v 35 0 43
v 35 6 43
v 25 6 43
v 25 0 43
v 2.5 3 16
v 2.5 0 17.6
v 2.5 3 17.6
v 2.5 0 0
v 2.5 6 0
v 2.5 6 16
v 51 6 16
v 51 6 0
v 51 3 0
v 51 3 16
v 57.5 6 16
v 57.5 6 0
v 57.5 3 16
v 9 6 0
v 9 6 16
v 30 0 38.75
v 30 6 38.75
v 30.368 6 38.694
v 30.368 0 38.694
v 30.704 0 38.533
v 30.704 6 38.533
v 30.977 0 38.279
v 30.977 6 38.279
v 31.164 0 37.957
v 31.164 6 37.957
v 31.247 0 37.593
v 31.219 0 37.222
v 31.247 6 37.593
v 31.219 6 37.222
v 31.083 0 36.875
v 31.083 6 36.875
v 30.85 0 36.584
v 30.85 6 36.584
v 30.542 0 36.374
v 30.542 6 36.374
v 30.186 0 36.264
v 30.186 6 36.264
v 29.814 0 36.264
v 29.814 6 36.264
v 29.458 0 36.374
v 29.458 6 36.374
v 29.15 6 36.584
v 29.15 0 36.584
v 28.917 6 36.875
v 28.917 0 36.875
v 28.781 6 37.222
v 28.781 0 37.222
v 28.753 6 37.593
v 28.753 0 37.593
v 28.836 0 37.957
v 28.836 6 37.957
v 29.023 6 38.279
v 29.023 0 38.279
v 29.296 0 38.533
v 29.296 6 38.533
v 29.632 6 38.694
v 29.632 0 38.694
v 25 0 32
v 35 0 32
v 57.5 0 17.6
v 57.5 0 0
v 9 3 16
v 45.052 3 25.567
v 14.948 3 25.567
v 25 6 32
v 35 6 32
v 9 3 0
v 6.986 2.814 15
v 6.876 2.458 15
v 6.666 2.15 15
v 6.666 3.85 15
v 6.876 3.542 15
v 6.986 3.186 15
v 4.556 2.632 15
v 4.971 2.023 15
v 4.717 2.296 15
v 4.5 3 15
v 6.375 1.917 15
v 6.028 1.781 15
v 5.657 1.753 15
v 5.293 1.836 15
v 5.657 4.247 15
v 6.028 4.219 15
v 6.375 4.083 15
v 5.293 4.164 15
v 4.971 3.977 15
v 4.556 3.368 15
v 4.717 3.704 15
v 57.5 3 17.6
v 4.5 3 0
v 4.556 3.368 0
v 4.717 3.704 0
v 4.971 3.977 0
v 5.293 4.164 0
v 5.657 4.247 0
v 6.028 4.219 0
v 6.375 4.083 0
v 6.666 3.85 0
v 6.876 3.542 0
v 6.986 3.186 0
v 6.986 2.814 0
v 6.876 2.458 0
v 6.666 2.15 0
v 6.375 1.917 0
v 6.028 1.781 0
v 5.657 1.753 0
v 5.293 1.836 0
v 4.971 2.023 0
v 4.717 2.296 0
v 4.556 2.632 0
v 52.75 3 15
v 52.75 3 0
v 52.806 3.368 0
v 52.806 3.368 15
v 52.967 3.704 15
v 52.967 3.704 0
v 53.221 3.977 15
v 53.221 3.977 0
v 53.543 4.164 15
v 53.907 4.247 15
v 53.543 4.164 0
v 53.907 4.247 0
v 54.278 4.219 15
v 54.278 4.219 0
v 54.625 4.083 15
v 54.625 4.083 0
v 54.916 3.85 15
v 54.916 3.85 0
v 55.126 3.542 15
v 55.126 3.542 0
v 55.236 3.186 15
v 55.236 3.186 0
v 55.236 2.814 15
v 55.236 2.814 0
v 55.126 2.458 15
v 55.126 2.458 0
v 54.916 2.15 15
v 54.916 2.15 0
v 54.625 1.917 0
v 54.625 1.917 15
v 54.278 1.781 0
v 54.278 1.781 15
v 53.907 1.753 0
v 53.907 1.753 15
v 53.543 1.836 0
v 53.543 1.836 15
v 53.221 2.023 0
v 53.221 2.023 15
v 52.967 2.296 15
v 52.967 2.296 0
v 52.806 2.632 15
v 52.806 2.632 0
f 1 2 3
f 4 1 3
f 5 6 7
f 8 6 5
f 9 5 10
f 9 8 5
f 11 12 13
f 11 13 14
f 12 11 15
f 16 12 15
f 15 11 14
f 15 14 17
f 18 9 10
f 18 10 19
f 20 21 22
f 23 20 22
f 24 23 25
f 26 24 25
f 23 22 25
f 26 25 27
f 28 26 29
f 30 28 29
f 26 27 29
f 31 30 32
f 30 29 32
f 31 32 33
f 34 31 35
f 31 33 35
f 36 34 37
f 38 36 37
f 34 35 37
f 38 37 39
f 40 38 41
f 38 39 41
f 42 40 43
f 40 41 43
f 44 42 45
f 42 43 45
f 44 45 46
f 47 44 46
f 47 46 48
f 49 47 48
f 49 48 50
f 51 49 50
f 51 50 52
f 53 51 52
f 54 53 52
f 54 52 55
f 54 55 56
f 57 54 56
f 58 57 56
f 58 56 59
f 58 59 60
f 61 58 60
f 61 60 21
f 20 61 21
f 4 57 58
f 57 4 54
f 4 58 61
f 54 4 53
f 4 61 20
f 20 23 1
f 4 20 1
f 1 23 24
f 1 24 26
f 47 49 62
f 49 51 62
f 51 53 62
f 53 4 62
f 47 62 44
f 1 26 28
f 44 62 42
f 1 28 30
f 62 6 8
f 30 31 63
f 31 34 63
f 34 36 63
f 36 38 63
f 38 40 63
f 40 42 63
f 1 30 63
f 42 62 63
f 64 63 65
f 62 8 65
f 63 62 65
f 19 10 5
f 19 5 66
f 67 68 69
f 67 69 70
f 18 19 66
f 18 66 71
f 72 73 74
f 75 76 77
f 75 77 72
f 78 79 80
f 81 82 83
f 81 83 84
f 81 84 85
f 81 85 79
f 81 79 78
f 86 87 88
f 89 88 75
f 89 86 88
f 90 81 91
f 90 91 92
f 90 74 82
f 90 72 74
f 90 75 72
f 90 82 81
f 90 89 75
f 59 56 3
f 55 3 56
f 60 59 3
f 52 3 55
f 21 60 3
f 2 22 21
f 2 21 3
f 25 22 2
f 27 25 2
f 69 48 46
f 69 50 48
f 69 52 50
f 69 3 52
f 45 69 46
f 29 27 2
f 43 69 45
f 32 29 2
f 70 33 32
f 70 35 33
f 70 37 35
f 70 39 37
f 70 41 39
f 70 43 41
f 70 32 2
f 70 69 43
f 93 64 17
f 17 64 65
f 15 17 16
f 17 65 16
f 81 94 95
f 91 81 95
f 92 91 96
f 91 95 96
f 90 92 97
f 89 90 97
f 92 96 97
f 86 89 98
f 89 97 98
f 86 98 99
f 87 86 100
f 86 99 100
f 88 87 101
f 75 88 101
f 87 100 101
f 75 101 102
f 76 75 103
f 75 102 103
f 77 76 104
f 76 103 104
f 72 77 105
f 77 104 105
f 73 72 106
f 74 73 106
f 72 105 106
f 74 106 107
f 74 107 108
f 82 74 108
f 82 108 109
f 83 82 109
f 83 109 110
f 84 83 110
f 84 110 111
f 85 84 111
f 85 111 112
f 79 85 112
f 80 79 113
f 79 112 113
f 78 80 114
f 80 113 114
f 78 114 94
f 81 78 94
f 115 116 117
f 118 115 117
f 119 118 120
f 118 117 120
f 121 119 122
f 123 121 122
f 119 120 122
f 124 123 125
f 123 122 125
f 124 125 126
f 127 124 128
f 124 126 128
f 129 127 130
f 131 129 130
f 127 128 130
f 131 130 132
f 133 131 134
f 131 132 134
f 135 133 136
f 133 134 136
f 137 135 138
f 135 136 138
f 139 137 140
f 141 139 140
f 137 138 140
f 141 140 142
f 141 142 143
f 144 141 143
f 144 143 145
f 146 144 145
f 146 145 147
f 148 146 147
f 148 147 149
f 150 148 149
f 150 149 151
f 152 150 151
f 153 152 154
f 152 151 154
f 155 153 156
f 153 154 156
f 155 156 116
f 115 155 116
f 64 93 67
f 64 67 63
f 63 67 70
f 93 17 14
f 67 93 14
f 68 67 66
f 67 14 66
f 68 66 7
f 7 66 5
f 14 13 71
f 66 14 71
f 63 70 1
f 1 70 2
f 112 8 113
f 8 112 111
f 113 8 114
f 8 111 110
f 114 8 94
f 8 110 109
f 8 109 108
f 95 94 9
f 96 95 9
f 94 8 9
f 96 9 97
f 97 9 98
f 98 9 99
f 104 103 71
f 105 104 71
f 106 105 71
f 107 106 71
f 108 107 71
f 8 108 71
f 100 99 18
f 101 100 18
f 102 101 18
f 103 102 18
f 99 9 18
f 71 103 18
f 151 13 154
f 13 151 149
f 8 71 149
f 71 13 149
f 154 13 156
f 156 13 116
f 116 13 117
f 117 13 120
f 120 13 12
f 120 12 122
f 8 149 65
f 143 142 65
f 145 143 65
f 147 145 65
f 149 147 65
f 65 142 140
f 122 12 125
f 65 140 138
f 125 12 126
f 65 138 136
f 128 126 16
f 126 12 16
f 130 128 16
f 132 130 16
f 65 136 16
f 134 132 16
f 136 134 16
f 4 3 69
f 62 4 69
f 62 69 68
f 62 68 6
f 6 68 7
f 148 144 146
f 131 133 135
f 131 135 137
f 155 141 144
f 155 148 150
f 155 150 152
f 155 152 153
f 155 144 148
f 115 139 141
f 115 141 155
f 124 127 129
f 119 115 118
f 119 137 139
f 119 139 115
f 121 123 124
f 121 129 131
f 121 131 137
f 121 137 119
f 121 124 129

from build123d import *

# Parameters (mm, degrees)
ESQUISSE1_W             = 60
ESQUISSE1_H             = 6
BOSS_EXTRU_1_DEPTH      = 60
ESQUISSE2_R             = 1.25
ENL_V_MAT_EXTRU_1_DEPTH = 15
ESQUISSE3_R             = 1.25
ENL_V_MAT_EXTRU_2_DEPTH = 15
ESQUISSE4_W             = 10
ESQUISSE4_H             = 11
ENL_V_MAT_EXTRU_3_DEPTH = 3
ENL_V_MAT_EXTRU_4_DEPTH = 52
CHANFREIN1_SIZE2        = 6.433520762
CHANFREIN1_SIZE         = 3
ESQUISSE6_W             = 2.5
ESQUISSE6_H             = 6
ENL_V_MAT_EXTRU_5_DEPTH = 40


with BuildPart() as part:
    # Esquisse1 → Boss.-Extru.1 (new body)
    with BuildSketch(Plane.XY):
        with Locations((30, 3)):
            Rectangle(ESQUISSE1_W, ESQUISSE1_H)
    extrude(amount=BOSS_EXTRU_1_DEPTH)

    # Esquisse2 → Enlèv. mat.-Extru.1 (cut)
    with BuildSketch(Plane(origin=(0, 0, 0), x_dir=(-1, 0, 0), z_dir=(0, 0, -1))):
        with Locations((-54, 3)):
            Circle(ESQUISSE2_R)
        with Locations((-5.75, 3)):
            Circle(ESQUISSE2_R)
    extrude(amount=-ENL_V_MAT_EXTRU_1_DEPTH, mode=Mode.SUBTRACT)

    # Esquisse3 → Enlèv. mat.-Extru.2 (cut)
    with BuildSketch(Plane(origin=(0, 6, 0), x_dir=(1, 0, 0), z_dir=(0, 1, 0))):
        with Locations(Location((30, -37.5, 0), (0, 0, 270))):
            Circle(ESQUISSE3_R)
    extrude(amount=-ENL_V_MAT_EXTRU_2_DEPTH, mode=Mode.SUBTRACT)

    # Esquisse4 → Enlèv. mat.-Extru.3 (cut)
    with BuildSketch(Plane(origin=(0, 6, 0), x_dir=(1, 0, 0), z_dir=(0, 1, 0))):
        Polygon((0, -16), (9, -16), (9, 0), (51, 0), (51, -16), (60, -16), (60, -60), (0, -60), align=None)
        with Locations((30, -37.5)):
            Rectangle(ESQUISSE4_W, ESQUISSE4_H, mode=Mode.SUBTRACT)
    extrude(amount=-ENL_V_MAT_EXTRU_3_DEPTH, mode=Mode.SUBTRACT)

    # Esquisse5 → Enlèv. mat.-Extru.4 (cut)
    with BuildSketch(Plane(origin=(0, 3, 0), x_dir=(1, 0, 0), z_dir=(0, 1, 0))):
        Polygon((60, -16), (35, -32), (35, -43), (25, -43), (25, -32), (0, -16), (-21.594855386, -85.475485762), (75.414479662, -69.930764824), align=None)
    extrude(amount=-ENL_V_MAT_EXTRU_4_DEPTH, mode=Mode.SUBTRACT)

    # Chanfrein1
    chanfrein1_edges = [part.edges().sort_by_distance(p)[0] for p in [
        (30, 3, 32),
    ]]
    chanfrein1_side = [part.faces().sort_by_distance(p)[0] for p in [
        (30, 3.06, 32),
    ]]
    chamfer(chanfrein1_edges, length=CHANFREIN1_SIZE - 0.0001, length2=CHANFREIN1_SIZE2 - 0.0001, reference=chanfrein1_side[0])  # a hair under: the kernel refuses the full size

    # Esquisse6 → Enlèv. mat.-Extru.5 (cut)
    with BuildSketch(Plane(origin=(0, 0, 0), x_dir=(-1, 0, 0), z_dir=(0, 0, -1))):
        with Locations((-58.75, 3)):
            Rectangle(ESQUISSE6_W, ESQUISSE6_H)
        with Locations((-1.25, 3)):
            Rectangle(ESQUISSE6_W, ESQUISSE6_H)
    extrude(amount=-ENL_V_MAT_EXTRU_5_DEPTH, mode=Mode.SUBTRACT)


solid = part.part
